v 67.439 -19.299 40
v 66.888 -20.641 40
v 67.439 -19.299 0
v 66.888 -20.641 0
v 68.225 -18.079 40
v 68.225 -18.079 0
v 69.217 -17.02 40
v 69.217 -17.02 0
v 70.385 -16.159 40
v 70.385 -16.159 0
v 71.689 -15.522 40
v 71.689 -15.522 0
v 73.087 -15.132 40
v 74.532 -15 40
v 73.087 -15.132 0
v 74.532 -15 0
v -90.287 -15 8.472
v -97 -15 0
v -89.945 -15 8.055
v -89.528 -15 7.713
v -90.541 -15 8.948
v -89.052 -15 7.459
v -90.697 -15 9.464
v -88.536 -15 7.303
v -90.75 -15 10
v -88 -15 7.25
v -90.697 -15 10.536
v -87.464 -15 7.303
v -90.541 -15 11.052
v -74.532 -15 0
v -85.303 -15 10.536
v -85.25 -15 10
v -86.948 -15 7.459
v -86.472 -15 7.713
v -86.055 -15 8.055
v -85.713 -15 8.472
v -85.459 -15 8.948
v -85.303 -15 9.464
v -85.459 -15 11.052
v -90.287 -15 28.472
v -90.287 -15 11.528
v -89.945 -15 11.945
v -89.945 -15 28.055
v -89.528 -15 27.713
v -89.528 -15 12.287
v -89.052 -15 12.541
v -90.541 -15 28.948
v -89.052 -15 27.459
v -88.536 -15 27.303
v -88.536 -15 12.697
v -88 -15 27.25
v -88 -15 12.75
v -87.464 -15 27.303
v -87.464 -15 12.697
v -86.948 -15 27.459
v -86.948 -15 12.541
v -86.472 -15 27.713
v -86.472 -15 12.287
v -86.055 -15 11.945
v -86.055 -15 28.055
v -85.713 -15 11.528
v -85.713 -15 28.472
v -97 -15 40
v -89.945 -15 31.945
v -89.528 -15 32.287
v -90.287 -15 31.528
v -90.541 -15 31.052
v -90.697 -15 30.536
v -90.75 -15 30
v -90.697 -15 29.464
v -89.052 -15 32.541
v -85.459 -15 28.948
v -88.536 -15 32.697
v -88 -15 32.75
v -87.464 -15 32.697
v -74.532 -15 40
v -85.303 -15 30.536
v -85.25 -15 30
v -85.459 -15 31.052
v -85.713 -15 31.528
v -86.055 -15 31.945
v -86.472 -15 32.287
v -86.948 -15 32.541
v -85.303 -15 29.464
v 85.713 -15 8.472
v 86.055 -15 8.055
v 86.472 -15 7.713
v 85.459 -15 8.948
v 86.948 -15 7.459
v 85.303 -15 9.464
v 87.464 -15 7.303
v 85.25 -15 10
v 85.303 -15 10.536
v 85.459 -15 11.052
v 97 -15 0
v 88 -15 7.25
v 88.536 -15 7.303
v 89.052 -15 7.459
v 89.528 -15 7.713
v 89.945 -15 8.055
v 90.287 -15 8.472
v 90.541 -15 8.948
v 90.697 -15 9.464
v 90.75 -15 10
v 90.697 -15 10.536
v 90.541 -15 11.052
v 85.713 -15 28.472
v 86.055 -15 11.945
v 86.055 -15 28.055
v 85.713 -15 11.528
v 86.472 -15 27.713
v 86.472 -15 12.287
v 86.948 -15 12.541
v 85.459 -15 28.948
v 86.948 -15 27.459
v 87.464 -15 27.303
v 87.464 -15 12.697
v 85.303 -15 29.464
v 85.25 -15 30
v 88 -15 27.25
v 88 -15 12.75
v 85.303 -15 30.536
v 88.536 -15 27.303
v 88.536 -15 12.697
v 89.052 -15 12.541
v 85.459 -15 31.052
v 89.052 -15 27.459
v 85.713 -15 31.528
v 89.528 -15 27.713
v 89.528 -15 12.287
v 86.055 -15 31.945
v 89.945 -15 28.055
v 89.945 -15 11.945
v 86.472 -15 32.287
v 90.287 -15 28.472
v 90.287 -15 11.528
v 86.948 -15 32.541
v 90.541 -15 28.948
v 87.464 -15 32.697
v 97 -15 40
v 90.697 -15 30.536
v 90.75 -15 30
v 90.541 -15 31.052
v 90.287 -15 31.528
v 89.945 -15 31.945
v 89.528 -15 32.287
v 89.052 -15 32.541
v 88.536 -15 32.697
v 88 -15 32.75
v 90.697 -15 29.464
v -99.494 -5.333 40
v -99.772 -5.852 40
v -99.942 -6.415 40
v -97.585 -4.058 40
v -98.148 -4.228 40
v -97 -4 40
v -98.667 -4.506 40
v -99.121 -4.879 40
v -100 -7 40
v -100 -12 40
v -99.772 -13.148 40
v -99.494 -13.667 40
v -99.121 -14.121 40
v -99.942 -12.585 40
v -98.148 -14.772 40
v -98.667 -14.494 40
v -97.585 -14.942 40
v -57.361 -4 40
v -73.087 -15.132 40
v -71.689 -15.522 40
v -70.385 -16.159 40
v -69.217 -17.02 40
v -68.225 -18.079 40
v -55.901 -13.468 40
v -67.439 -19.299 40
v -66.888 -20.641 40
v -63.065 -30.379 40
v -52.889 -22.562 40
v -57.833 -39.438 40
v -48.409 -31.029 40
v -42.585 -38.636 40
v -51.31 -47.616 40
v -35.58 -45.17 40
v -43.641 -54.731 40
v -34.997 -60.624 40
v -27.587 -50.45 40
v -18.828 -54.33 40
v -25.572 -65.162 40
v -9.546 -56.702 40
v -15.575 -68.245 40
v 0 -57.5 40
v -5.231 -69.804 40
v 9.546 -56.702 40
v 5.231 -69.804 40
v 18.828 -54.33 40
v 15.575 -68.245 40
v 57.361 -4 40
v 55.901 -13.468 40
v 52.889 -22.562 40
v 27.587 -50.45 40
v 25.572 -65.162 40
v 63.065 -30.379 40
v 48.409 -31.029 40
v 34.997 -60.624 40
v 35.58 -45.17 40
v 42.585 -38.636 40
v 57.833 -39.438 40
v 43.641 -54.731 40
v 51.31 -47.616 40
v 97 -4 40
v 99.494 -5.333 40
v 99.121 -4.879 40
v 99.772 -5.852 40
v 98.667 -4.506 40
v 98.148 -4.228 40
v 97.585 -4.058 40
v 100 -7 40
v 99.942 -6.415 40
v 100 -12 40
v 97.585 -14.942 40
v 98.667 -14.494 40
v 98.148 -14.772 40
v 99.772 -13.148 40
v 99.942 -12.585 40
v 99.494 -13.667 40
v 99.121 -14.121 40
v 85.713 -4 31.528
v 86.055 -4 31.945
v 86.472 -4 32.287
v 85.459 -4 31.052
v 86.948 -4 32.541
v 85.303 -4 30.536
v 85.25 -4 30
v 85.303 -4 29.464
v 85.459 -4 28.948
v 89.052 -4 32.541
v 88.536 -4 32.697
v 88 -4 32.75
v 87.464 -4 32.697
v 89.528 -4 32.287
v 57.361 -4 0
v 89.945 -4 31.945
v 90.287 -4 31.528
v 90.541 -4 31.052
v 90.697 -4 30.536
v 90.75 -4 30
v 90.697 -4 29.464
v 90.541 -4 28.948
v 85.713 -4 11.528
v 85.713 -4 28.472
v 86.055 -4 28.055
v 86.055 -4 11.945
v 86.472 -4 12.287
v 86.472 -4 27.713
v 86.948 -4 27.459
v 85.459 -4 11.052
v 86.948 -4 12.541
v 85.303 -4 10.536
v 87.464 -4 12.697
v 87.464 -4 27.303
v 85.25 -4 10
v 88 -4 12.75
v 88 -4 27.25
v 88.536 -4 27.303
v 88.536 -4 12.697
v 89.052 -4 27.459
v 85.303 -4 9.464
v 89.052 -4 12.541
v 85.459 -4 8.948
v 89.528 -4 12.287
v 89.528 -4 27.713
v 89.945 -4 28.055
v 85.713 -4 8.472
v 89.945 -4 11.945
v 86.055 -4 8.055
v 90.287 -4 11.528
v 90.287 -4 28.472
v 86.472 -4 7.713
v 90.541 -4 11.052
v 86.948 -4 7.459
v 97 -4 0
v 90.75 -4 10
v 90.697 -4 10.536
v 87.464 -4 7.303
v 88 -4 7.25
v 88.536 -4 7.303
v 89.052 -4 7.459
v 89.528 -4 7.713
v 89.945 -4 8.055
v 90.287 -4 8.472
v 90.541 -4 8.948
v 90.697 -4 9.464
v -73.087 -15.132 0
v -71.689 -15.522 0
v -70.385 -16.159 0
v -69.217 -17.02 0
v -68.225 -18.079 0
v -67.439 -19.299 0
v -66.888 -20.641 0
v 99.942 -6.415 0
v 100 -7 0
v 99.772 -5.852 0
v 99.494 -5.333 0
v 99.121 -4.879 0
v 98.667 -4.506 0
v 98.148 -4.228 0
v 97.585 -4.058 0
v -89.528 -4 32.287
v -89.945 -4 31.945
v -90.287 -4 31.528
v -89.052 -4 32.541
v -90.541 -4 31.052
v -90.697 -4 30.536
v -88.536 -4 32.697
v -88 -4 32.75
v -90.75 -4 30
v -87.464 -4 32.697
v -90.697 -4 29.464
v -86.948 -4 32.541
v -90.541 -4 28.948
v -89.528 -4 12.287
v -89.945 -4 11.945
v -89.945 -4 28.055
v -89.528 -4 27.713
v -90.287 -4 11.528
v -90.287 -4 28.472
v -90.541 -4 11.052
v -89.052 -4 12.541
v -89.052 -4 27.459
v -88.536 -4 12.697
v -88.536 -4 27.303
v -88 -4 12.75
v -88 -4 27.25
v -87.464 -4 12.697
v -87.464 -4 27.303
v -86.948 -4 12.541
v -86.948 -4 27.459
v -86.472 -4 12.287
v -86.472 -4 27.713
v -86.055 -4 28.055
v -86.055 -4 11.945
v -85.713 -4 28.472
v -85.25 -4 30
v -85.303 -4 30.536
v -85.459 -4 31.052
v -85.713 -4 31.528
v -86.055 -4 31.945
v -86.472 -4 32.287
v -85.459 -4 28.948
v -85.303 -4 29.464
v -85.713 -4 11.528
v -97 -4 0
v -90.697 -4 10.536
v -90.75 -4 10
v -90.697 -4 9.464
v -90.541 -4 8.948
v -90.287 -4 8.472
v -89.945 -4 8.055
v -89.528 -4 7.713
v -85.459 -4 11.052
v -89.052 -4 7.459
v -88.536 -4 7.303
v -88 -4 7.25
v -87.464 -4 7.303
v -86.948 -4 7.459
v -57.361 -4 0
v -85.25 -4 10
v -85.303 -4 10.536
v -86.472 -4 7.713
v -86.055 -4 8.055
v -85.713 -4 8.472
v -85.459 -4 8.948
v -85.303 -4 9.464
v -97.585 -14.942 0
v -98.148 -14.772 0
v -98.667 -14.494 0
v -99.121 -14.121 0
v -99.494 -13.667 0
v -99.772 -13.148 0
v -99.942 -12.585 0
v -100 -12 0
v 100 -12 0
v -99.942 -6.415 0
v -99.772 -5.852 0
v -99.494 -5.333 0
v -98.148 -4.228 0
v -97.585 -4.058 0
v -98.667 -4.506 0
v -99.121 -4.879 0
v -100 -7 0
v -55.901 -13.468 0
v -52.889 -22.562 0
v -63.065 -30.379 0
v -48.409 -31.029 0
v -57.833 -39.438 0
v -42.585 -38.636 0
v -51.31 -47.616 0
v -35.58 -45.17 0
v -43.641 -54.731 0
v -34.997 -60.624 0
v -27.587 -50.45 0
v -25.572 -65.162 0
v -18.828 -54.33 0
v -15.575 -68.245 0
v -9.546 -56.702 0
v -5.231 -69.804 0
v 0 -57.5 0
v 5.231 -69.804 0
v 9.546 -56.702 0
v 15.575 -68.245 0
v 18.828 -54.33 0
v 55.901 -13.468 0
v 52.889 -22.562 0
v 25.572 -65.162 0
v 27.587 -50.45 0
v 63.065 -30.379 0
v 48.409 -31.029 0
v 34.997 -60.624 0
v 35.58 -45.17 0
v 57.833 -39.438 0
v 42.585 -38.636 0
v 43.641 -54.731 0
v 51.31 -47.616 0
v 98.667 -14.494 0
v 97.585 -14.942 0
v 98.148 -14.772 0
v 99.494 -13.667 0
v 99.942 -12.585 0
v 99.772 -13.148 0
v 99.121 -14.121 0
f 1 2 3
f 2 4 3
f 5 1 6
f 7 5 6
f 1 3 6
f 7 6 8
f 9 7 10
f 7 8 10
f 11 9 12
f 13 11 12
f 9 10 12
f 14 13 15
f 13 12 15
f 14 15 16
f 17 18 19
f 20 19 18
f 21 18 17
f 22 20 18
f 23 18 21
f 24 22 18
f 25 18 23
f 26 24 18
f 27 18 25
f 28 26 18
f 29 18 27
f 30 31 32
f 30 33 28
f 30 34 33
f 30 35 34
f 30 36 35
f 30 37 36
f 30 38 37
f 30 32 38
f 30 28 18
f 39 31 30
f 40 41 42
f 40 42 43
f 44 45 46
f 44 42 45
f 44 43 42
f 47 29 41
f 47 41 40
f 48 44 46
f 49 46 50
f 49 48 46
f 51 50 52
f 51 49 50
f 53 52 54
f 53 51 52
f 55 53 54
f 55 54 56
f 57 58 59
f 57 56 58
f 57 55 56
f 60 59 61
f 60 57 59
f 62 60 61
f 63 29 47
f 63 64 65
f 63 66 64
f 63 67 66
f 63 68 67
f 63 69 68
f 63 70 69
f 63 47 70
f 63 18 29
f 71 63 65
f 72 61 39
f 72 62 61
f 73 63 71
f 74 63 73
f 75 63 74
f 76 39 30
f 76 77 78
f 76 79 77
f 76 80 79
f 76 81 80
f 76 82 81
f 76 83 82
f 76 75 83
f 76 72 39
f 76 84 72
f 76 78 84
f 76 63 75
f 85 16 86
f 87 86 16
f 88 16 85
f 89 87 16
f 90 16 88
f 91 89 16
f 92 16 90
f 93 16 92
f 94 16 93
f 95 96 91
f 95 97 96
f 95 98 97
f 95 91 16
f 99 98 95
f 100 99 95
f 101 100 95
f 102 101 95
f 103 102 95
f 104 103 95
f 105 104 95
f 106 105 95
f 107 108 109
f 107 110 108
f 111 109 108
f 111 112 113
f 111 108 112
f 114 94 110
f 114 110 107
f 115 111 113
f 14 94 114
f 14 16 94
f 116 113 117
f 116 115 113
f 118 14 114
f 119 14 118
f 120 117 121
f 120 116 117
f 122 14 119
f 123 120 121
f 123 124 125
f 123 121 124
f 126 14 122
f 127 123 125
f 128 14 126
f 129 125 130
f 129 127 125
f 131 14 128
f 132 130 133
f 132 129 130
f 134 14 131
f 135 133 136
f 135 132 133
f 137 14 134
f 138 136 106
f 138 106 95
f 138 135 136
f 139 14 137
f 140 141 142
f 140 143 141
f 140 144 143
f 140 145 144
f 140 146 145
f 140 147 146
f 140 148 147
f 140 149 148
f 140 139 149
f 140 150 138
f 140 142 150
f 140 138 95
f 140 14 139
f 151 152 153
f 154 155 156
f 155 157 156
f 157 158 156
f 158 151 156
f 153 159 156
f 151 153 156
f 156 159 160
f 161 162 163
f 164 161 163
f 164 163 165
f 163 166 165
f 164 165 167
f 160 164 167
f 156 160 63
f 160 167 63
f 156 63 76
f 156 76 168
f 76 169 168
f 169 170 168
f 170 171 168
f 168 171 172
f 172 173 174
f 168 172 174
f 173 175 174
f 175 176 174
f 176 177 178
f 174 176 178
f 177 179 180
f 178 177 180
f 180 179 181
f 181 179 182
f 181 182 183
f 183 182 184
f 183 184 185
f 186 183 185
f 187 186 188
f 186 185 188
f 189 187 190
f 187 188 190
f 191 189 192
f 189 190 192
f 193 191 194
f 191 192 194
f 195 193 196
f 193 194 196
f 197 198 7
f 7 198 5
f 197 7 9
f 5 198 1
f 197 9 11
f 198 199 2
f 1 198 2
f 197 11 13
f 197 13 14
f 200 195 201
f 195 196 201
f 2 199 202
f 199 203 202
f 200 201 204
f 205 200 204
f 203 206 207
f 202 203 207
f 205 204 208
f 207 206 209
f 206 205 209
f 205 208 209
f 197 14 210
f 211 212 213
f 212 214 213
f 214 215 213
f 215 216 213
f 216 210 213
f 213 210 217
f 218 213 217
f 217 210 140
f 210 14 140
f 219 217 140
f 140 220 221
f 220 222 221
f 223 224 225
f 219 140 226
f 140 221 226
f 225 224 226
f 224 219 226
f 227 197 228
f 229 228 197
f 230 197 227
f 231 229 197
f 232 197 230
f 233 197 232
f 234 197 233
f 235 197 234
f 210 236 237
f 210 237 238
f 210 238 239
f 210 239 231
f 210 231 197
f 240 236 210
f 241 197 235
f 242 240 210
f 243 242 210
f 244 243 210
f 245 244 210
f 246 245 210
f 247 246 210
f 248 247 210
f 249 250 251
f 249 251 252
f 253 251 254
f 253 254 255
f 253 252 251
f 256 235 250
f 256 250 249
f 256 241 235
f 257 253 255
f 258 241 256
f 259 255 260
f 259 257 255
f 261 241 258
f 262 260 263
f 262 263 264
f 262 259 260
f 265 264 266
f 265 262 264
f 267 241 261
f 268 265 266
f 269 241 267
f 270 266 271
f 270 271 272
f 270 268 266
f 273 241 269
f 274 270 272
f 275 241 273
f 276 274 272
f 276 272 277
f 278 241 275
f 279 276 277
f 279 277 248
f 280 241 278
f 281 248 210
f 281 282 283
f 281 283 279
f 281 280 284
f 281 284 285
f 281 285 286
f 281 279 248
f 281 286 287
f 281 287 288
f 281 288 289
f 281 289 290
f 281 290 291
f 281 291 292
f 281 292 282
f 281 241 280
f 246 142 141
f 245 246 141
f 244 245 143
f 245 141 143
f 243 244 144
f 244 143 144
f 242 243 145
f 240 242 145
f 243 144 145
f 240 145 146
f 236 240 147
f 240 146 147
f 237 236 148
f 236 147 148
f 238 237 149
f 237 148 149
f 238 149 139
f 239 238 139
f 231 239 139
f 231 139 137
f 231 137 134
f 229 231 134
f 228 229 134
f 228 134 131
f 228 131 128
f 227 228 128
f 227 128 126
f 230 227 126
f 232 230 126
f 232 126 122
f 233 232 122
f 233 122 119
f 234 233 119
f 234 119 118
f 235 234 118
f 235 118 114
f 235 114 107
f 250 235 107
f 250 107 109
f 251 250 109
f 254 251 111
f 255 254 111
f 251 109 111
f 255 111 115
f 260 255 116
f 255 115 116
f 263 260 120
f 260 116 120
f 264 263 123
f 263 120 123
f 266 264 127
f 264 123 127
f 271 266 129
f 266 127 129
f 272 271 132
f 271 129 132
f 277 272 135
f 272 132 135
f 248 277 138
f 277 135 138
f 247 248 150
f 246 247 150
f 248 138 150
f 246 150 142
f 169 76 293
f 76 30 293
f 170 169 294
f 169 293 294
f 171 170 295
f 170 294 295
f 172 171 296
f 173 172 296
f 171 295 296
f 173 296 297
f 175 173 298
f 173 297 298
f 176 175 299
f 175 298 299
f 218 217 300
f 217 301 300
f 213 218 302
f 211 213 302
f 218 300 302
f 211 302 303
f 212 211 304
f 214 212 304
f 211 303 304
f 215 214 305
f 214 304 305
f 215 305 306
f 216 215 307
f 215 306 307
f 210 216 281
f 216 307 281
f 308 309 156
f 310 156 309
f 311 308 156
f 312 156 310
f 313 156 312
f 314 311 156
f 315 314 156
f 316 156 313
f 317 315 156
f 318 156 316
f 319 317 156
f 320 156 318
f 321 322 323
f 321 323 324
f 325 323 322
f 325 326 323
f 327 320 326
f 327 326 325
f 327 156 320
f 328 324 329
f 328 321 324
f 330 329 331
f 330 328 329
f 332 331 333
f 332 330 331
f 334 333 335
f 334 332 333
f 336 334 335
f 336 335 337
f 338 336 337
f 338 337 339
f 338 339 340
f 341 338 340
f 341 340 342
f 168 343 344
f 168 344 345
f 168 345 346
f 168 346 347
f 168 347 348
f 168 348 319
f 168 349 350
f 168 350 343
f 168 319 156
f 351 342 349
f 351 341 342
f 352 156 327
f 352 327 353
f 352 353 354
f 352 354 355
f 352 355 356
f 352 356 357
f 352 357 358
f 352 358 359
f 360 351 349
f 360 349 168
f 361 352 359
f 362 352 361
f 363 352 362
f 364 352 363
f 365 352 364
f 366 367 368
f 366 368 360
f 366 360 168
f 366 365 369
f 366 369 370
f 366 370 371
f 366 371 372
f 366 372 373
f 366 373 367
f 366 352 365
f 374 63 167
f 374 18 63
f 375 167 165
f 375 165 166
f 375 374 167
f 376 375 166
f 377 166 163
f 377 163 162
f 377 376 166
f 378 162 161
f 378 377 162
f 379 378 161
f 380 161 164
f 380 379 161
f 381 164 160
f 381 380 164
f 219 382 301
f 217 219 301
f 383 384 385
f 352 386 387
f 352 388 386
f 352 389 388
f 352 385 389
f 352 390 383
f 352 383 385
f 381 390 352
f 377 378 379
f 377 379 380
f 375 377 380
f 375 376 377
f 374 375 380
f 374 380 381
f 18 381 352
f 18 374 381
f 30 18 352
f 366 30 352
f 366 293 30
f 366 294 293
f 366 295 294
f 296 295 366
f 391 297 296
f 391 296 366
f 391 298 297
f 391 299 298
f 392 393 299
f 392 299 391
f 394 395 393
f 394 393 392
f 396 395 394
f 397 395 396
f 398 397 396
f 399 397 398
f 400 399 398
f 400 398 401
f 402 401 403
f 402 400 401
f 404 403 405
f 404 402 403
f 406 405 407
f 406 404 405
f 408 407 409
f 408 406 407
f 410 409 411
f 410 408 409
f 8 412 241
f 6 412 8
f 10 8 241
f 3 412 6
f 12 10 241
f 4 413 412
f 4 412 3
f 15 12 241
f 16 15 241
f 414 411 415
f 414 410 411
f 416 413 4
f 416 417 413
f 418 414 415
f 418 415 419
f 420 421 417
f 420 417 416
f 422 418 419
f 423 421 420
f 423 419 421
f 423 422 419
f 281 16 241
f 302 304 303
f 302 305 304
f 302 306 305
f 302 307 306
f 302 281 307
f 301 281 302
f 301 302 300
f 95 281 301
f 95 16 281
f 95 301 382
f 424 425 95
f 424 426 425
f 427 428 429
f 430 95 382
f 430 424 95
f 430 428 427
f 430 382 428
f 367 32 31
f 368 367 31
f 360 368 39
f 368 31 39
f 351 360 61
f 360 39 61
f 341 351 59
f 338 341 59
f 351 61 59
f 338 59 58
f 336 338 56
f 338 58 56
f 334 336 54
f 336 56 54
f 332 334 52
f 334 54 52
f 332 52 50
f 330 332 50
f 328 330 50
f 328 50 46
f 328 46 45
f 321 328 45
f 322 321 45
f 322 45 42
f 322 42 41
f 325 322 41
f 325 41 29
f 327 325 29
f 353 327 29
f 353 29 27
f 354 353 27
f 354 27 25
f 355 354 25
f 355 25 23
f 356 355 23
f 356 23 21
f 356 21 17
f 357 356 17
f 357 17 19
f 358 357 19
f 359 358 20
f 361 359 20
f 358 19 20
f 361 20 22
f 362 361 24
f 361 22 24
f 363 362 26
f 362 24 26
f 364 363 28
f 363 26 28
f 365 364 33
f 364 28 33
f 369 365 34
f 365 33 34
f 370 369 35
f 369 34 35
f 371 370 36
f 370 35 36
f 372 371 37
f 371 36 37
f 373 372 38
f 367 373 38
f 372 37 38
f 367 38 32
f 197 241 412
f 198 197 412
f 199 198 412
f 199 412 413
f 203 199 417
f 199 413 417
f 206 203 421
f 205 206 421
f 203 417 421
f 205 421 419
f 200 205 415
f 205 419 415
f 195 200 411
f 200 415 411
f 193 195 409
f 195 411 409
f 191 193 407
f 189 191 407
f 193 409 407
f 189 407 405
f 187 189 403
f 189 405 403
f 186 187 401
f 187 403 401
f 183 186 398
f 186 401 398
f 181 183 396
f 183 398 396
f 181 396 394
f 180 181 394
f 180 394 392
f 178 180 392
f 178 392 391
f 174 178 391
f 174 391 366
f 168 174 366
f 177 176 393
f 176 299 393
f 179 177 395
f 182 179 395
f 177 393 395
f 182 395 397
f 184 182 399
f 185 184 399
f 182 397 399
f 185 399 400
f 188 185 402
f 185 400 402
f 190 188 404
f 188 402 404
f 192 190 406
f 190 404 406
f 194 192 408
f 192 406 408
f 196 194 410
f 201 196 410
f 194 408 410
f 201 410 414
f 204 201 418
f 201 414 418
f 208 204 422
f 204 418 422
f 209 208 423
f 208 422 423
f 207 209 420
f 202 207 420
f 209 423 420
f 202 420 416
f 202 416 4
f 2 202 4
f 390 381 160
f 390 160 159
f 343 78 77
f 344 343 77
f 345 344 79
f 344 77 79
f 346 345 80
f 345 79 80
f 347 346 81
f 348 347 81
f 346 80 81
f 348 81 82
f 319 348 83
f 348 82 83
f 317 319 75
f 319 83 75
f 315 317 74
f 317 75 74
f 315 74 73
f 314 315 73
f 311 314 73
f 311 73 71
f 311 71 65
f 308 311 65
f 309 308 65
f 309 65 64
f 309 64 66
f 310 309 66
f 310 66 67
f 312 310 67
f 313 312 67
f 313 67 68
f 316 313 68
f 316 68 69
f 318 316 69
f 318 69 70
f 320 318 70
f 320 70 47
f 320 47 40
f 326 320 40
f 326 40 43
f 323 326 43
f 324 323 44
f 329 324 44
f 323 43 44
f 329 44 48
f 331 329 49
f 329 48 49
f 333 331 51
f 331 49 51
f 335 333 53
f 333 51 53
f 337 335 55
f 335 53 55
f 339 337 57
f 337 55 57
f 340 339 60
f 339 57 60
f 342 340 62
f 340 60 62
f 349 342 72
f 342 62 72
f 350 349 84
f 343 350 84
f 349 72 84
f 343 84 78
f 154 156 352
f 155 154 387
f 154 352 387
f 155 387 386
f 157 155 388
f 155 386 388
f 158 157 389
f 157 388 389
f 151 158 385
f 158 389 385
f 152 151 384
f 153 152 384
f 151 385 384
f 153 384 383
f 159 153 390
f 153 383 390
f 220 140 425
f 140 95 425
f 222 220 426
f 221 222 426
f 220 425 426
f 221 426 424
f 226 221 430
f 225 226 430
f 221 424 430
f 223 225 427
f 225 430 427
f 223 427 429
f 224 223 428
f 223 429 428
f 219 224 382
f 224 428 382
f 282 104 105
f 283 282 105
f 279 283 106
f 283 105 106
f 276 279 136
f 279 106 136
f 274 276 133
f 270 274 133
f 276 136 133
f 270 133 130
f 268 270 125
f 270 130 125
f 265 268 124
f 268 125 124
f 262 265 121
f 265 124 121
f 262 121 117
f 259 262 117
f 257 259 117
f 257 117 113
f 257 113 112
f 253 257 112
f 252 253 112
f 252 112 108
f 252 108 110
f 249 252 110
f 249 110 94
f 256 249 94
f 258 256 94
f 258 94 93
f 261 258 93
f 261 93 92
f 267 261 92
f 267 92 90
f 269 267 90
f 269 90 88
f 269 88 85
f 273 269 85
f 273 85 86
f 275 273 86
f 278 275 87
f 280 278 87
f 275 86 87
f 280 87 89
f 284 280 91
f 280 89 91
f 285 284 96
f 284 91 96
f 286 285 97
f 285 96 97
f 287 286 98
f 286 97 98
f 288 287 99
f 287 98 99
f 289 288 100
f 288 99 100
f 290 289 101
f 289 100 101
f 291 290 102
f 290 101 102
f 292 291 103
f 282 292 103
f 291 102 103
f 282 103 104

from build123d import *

# Parameters (mm, degrees)
SKETCH_R           = 70
SKETCH_R_2         = 57.5
PAD_DEPTH          = 40
SKETCH001_W        = 40
SKETCH001_H        = 30
PAD001_DEPTH       = 40
PAD001_FACE1_W     = 31.626028
PAD001_FACE1_H     = 40
POCKET_DEPTH       = 10
POCKET_FACE3_W     = 31.626028
POCKET_FACE3_H     = 40
POCKET001_DEPTH    = 10
POCKET001_FACE6_W  = 31.626028
POCKET001_FACE6_H  = 40
POCKET002_DEPTH    = 9
POCKET002_FACE11_W = 31.626028
POCKET002_FACE11_H = 40
POCKET003_DEPTH    = 9
SKETCH002_R        = 70
PAD002_DEPTH       = 40
SKETCH003_R        = 57.5
POCKET004_DEPTH    = 522
SKETCH004_W        = 150
SKETCH004_H        = 100
POCKET005_DEPTH    = 40
FILLET_R           = 8
FILLET001_R        = 3
SKETCH005_R        = 2.75
POCKET006_DEPTH    = 20


with BuildPart() as part:
    # Sketch → Pad (new body)
    with BuildSketch(Plane.XY):
        Circle(SKETCH_R)
        Circle(SKETCH_R_2, mode=Mode.SUBTRACT)
    extrude(amount=PAD_DEPTH)

    # Sketch001 (on Face4 of Pad) → Pad001 (join)
    with BuildSketch(Plane.XY.offset(40)):
        with Locations((-80, 0)):
            Rectangle(SKETCH001_W, SKETCH001_H)
        with Locations((80, 0)):
            Rectangle(SKETCH001_W, SKETCH001_H)
    extrude(amount=-PAD001_DEPTH)

    # Pad001 Face1 → Pocket (cut)
    with BuildSketch(Plane(origin=(84.186986, 15, 20), x_dir=(1, 0, 0), z_dir=(0, 1, 0))):
        Rectangle(PAD001_FACE1_W, PAD001_FACE1_H)
    extrude(amount=-POCKET_DEPTH, mode=Mode.SUBTRACT)

    # Pocket Face3 → Pocket001 (cut)
    with BuildSketch(Plane(origin=(-84.186986, 15, 20), x_dir=(1, 0, 0), z_dir=(0, 1, 0))):
        Rectangle(POCKET_FACE3_W, POCKET_FACE3_H)
    extrude(amount=-POCKET001_DEPTH, mode=Mode.SUBTRACT)

    # Pocket001 Face6 → Pocket002 (cut)
    with BuildSketch(Plane(origin=(-84.186986, 5, 20), x_dir=(1, 0, 0), z_dir=(0, 1, 0))):
        Rectangle(POCKET001_FACE6_W, POCKET001_FACE6_H)
    extrude(amount=-POCKET002_DEPTH, mode=Mode.SUBTRACT)

    # Pocket002 Face11 → Pocket003 (cut)
    with BuildSketch(Plane(origin=(84.186986, 5, 20), x_dir=(1, 0, 0), z_dir=(0, 1, 0))):
        Rectangle(POCKET002_FACE11_W, POCKET002_FACE11_H)
    extrude(amount=-POCKET003_DEPTH, mode=Mode.SUBTRACT)

    # Sketch002 (on Face2 of Pocket003) → Pad002 (join)
    with BuildSketch(Plane(origin=(0, 0, 0), x_dir=(1, 0, 0), z_dir=(0, 0, -1))):
        Circle(SKETCH002_R)
    extrude(amount=-PAD002_DEPTH)

    # Sketch003 (on Face8 of Pad002) → Pocket004 (cut)
    with BuildSketch(Plane(origin=(0, 0, 0), x_dir=(1, 0, 0), z_dir=(0, 0, -1))):
        Circle(SKETCH003_R)
    extrude(amount=-POCKET004_DEPTH, mode=Mode.SUBTRACT)

    # Sketch004 (on Face5 of Pocket004) → Pocket005 (cut)
    with BuildSketch(Plane(origin=(0, 0, 0), x_dir=(1, 0, 0), z_dir=(0, 0, -1))):
        with Locations((0, -46)):
            Rectangle(SKETCH004_W, SKETCH004_H)
    extrude(amount=-POCKET005_DEPTH, mode=Mode.SUBTRACT)

    # Fillet
    fillet_edges = [part.edges().sort_by_distance(p)[0] for p in [
        (-68.373972, -15, 20),
        (68.373972, -15, 20),
    ]]
    fillet(fillet_edges, radius=FILLET_R)

    # Fillet001
    fillet001_edges = [part.edges().sort_by_distance(p)[0] for p in [
        (100, -15, 20),
        (100, -4, 20),
        (-100, -15, 20),
        (-100, -4, 20),
    ]]
    fillet(fillet001_edges, radius=FILLET001_R)

    # Sketch005 (on Face10 of Fillet001) → Pocket006 (cut)
    with BuildSketch(Plane.XZ.offset(15)):
        with Locations((-88, 30)):
            Circle(SKETCH005_R)
        with Locations((-88, 10)):
            Circle(SKETCH005_R)
        with Locations((88, 30)):
            Circle(SKETCH005_R)
        with Locations((88, 10)):
            Circle(SKETCH005_R)
    extrude(amount=-POCKET006_DEPTH, mode=Mode.SUBTRACT)


solid = part.part
